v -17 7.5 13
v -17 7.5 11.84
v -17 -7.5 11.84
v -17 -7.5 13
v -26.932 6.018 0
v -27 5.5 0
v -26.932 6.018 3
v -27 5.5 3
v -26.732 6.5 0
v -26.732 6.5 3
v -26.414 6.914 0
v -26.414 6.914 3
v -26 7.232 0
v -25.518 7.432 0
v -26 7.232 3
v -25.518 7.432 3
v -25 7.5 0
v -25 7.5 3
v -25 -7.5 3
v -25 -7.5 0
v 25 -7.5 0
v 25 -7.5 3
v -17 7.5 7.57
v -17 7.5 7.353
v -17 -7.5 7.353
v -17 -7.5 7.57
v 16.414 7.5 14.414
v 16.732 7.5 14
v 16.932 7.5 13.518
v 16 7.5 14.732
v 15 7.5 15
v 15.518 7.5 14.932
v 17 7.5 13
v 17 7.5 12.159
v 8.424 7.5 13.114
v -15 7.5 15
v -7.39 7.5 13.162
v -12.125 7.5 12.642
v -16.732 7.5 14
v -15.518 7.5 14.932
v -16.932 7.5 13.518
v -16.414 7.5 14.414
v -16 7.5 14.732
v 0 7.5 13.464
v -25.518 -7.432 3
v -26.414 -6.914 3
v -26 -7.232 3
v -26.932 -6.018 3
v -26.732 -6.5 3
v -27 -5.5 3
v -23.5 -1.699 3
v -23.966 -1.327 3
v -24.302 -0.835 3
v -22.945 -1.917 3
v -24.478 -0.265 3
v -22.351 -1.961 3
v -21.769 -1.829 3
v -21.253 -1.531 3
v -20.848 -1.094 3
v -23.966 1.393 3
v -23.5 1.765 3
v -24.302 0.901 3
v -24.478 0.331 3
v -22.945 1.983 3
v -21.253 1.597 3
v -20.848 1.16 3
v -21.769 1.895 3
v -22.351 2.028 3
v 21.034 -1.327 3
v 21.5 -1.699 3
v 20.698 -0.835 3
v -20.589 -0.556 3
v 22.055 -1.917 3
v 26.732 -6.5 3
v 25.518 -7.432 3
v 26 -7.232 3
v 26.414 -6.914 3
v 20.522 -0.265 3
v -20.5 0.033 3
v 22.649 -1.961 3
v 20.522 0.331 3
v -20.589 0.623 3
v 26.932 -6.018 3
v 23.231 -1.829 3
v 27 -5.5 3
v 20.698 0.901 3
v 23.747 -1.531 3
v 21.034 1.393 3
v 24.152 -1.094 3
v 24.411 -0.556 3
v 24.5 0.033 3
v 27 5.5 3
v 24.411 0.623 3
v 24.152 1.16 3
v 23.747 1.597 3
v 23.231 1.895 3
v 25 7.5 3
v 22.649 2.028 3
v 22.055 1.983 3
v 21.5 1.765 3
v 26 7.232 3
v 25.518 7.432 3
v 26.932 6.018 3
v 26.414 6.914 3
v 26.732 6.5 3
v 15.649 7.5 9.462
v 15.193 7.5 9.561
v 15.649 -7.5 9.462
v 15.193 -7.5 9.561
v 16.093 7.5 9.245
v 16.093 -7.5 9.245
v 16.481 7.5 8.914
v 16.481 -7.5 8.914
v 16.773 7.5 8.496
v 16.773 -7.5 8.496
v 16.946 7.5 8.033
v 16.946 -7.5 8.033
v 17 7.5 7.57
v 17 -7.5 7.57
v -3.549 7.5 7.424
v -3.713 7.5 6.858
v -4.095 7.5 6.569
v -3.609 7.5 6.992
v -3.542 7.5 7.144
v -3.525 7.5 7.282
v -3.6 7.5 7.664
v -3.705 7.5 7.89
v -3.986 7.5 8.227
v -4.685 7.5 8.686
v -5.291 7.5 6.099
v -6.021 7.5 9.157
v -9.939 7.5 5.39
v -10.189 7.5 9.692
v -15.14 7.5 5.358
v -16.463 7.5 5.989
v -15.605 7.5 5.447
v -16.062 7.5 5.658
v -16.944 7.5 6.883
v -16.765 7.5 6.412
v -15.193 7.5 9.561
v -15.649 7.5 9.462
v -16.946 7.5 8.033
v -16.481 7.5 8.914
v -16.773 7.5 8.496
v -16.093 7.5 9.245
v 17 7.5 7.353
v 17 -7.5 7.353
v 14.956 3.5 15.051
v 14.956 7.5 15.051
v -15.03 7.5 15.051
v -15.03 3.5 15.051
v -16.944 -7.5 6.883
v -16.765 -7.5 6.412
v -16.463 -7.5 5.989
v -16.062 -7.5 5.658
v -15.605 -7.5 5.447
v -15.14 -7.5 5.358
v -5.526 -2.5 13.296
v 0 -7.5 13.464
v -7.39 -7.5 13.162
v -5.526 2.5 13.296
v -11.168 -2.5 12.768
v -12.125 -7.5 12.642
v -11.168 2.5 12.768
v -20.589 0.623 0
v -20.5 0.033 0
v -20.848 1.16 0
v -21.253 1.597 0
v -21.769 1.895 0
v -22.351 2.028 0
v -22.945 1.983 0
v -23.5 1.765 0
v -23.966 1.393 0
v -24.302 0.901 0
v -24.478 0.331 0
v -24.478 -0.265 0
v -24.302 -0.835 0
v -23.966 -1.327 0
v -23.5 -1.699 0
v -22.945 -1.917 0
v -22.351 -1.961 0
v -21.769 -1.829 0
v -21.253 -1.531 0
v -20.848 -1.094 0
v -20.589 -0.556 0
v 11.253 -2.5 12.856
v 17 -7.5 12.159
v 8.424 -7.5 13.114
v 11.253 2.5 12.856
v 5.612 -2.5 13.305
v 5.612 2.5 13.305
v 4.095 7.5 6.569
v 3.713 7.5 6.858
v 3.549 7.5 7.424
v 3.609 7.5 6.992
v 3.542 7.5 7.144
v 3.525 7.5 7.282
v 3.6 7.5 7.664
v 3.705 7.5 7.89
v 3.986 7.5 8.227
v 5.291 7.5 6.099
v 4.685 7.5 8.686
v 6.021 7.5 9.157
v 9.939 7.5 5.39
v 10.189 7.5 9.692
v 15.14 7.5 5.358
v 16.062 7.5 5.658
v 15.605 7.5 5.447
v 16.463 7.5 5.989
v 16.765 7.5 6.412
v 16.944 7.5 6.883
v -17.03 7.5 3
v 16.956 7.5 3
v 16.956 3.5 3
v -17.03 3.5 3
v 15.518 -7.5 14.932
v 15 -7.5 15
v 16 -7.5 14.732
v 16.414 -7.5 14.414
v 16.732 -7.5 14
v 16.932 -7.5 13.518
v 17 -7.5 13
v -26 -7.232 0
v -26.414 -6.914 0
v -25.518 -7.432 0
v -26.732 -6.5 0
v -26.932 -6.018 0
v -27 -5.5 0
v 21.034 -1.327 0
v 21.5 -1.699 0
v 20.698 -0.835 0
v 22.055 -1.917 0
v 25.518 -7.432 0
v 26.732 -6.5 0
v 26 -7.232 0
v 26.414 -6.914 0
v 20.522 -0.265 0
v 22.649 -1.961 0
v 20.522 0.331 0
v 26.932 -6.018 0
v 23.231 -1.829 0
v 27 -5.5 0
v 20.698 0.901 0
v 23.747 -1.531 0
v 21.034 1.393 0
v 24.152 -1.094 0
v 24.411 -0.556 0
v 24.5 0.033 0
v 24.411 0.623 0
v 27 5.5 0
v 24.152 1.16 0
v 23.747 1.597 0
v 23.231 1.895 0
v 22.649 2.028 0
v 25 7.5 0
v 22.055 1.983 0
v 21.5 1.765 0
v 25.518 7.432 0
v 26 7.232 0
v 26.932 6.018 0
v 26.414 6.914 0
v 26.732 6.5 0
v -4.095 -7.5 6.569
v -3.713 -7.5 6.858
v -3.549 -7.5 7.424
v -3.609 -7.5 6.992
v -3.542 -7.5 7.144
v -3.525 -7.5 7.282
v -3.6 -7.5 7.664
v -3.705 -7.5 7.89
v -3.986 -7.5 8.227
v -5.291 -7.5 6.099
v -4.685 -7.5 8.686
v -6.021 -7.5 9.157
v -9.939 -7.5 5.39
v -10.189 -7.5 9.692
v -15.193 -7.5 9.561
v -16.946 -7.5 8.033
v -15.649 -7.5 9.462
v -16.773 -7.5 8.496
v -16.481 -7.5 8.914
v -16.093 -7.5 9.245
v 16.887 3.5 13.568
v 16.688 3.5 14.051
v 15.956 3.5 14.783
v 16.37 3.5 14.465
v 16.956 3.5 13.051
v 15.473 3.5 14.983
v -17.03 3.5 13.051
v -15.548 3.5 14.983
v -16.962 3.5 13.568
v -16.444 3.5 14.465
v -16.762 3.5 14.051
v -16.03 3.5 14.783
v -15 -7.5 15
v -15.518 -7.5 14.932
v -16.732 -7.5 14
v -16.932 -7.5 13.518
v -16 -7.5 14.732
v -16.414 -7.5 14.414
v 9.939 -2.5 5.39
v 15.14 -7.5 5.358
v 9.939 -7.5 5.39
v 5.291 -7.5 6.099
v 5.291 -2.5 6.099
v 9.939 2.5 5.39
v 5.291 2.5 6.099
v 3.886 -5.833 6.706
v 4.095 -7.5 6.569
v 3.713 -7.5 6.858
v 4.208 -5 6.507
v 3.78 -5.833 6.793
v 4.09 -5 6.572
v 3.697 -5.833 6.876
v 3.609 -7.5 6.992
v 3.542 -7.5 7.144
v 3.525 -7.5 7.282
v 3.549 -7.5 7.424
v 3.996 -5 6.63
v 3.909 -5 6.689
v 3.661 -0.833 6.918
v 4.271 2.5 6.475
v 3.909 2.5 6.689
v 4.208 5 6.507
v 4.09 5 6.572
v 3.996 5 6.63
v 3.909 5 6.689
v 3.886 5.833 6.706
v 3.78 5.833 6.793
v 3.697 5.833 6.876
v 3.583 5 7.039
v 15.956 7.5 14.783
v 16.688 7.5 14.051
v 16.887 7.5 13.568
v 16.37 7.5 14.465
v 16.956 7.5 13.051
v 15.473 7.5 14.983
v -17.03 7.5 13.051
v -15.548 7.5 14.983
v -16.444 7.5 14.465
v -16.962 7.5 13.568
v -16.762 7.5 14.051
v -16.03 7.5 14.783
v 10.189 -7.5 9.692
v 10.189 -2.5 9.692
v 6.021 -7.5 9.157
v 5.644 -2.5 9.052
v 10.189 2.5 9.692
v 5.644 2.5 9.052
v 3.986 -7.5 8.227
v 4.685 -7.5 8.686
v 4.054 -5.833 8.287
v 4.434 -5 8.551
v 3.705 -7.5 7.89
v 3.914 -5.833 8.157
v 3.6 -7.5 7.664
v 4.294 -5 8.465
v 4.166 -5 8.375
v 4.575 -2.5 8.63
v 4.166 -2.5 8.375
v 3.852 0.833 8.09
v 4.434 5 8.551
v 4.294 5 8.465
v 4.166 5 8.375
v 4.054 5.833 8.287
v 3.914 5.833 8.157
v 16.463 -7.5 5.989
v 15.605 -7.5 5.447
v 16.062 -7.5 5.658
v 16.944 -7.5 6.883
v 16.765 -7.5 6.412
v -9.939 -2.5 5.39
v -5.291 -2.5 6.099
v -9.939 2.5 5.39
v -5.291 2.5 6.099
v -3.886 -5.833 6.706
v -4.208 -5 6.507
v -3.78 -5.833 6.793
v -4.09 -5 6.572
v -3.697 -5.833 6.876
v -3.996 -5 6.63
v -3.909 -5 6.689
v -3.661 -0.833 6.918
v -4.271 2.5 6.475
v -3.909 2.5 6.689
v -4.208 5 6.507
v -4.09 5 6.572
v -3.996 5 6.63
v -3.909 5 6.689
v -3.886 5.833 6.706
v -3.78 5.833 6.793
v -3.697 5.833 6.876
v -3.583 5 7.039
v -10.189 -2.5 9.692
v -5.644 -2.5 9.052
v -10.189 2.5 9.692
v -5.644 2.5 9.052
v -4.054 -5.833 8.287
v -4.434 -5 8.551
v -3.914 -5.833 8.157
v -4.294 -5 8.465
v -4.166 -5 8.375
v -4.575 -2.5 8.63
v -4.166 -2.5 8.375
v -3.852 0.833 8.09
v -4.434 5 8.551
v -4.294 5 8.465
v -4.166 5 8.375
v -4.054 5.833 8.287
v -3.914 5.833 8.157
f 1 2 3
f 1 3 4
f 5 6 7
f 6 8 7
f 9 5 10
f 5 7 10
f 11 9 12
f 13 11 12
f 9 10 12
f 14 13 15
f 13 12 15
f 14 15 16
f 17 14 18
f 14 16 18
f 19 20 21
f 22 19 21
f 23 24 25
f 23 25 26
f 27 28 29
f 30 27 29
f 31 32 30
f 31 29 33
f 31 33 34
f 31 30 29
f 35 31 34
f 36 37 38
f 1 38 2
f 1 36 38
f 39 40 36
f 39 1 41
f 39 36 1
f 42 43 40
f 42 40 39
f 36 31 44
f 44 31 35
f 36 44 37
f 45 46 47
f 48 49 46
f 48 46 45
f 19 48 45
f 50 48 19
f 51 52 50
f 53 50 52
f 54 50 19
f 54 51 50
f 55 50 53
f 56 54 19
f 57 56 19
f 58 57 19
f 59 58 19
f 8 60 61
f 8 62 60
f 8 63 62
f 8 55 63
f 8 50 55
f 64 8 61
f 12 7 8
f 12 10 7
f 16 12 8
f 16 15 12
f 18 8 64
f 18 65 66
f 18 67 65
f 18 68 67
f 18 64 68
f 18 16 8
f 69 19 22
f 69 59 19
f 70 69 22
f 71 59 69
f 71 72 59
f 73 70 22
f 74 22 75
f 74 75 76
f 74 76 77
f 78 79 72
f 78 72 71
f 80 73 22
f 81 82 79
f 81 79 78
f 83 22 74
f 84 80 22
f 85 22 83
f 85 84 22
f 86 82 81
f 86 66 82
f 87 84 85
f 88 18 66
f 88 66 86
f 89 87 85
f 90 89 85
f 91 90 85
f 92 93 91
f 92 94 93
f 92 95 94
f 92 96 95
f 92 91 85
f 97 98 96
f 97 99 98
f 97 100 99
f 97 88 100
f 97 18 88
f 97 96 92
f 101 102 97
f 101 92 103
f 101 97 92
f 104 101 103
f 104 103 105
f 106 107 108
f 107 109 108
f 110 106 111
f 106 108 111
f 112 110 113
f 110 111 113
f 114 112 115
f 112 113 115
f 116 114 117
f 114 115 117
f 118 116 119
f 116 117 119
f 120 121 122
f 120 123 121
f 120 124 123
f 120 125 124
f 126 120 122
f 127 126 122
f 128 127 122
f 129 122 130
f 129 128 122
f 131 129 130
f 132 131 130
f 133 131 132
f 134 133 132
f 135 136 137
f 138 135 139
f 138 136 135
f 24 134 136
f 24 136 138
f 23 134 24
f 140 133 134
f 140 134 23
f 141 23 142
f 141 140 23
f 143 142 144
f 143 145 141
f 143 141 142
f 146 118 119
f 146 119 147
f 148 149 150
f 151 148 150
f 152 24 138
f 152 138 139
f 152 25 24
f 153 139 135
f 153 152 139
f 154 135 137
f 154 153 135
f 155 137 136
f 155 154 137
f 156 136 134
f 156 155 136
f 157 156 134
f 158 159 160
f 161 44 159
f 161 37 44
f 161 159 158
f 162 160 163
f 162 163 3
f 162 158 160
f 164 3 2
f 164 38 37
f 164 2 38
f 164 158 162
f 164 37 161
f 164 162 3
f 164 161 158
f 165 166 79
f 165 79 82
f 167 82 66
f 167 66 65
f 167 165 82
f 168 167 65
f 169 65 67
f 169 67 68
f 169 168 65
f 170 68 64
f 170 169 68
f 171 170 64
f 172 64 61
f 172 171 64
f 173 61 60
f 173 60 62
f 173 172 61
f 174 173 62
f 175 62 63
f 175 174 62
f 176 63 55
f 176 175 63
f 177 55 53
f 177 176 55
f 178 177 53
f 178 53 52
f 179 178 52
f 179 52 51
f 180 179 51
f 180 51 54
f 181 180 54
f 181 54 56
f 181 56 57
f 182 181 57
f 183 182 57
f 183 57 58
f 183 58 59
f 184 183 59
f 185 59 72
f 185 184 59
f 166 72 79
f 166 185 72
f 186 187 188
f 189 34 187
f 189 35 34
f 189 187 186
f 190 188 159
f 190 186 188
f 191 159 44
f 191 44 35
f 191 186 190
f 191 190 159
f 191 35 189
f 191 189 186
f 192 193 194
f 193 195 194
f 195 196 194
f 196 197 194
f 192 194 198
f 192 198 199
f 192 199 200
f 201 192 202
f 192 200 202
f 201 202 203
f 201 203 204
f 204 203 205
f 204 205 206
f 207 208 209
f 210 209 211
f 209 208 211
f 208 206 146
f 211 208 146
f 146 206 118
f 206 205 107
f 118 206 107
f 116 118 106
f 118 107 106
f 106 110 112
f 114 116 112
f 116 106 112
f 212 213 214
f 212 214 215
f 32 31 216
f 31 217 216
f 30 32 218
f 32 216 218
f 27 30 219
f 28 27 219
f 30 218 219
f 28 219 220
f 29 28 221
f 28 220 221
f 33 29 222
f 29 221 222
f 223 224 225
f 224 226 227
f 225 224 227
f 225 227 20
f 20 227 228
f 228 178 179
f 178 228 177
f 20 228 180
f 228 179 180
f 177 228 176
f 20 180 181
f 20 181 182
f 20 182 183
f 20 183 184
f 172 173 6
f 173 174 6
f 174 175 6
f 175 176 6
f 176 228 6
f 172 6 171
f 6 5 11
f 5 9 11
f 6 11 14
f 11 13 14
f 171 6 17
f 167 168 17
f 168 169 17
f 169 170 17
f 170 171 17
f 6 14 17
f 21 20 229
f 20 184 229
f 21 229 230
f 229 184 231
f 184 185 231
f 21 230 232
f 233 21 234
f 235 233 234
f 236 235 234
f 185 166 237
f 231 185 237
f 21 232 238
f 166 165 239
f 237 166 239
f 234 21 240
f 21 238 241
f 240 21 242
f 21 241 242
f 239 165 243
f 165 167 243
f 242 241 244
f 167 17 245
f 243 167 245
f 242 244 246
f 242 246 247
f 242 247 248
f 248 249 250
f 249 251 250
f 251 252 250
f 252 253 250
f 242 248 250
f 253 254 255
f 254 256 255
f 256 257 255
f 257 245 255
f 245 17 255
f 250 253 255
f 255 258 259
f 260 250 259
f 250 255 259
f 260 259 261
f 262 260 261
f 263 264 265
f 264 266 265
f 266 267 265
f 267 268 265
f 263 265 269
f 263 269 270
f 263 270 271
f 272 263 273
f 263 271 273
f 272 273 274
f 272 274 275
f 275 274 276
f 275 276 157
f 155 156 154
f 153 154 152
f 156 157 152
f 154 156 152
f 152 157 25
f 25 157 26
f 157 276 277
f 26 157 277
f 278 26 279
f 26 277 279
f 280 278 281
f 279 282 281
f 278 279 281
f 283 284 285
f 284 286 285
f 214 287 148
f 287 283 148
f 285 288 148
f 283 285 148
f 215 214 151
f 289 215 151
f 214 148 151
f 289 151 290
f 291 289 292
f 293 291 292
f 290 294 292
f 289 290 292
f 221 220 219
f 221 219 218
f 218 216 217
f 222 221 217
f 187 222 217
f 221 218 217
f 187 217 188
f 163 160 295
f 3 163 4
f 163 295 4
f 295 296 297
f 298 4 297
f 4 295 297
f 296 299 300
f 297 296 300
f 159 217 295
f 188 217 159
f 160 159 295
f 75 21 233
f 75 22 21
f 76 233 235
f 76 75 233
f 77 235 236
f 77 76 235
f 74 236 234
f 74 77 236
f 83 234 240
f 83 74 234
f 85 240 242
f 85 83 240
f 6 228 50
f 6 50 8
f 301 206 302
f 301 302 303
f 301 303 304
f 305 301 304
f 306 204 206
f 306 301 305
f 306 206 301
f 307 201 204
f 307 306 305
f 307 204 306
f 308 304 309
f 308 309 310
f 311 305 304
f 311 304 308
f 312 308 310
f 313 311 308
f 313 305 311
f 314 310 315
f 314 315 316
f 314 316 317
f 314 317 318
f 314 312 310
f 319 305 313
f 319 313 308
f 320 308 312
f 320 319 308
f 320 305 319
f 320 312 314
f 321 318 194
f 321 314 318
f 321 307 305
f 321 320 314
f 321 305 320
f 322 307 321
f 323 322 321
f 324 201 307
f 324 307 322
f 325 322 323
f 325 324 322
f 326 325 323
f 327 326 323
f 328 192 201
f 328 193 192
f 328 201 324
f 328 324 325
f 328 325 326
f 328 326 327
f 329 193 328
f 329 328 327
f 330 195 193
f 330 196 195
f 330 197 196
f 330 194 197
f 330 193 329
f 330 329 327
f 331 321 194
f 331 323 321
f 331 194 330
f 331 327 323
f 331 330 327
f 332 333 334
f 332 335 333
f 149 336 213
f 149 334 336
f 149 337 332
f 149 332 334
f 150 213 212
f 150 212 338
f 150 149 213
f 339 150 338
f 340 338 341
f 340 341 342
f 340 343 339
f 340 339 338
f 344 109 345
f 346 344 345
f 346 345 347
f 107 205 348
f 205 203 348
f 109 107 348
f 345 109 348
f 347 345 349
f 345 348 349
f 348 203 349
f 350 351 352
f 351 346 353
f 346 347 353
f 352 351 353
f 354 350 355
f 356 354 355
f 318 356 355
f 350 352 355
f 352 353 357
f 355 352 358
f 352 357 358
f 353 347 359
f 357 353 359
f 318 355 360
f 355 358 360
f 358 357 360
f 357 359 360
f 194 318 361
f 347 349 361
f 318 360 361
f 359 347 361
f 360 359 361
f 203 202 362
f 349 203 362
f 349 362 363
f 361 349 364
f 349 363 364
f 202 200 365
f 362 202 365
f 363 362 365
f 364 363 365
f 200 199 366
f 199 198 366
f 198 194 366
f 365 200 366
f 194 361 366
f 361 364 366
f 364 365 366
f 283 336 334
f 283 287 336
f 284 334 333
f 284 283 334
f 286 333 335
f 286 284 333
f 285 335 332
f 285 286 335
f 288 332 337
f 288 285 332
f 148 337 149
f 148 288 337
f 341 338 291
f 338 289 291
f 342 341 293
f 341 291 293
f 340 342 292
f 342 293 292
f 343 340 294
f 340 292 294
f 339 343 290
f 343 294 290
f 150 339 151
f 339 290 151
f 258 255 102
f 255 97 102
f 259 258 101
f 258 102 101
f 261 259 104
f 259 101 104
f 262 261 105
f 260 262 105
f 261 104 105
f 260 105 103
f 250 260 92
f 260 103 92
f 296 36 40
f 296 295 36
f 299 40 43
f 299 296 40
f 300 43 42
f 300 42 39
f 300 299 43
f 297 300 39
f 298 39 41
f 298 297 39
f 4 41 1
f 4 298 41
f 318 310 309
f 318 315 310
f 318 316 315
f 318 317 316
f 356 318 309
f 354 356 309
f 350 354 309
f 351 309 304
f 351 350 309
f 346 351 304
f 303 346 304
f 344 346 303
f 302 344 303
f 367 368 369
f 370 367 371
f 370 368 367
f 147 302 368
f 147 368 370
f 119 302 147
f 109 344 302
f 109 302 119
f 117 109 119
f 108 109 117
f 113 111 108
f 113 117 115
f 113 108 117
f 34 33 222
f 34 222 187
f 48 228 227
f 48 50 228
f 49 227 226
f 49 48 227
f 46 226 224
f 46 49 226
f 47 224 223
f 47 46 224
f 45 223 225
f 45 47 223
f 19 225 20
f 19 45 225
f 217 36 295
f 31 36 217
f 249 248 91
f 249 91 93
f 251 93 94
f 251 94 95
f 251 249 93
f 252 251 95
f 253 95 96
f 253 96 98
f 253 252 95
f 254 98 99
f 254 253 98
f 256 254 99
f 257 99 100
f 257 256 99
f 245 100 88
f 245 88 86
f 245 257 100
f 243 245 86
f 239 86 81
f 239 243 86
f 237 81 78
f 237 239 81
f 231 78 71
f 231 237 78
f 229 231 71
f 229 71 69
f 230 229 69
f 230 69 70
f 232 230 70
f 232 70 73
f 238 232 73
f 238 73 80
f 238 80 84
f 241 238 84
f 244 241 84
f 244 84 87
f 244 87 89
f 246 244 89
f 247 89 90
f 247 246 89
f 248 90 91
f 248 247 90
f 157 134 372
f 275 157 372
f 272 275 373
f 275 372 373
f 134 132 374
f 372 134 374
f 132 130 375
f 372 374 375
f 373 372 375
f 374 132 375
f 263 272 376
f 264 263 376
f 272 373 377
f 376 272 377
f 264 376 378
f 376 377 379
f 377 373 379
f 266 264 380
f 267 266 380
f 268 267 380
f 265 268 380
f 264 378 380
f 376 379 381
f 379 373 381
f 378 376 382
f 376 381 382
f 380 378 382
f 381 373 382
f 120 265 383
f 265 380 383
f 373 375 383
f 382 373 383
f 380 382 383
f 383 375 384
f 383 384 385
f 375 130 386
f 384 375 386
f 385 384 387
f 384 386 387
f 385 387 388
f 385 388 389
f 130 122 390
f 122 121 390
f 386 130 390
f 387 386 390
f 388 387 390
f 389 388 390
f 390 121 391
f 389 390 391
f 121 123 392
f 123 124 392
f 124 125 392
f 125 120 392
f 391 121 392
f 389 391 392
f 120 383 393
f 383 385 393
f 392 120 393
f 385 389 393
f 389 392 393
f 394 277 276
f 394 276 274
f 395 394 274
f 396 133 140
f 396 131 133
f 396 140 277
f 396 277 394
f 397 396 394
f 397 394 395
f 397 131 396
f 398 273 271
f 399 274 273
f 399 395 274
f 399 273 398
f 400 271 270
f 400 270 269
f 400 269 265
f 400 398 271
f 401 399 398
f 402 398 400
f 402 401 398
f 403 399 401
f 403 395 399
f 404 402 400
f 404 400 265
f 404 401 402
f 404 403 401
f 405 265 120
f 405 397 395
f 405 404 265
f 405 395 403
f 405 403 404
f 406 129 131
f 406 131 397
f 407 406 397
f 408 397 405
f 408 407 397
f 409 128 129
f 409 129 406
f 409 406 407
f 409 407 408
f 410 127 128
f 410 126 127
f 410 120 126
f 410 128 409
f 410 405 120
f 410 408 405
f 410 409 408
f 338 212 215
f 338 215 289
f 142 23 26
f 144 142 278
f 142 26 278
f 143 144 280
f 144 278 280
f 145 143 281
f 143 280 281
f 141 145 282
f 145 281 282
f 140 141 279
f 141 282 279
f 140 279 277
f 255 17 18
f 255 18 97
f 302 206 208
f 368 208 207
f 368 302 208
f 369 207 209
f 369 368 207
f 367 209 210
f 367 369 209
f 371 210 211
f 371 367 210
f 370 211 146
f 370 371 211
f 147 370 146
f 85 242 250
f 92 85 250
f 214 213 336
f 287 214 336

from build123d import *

# Parameters (mm, degrees)
F0_W     = 54
F0_H     = 15
F0_R     = 2
F1_DEPTH = 3
F3_DEPTH = 15
F4_W     = 33.9856799692
F4_H     = 12.0507893413
F5_DEPTH = 4
F6_R     = 2
F6_2_R   = 2
F6_3_R   = 2
F6_4_R   = 2
F6_5_R   = 2


with BuildPart() as f1:
    # F0 (on Top) → F1 (new body)
    with BuildSketch(Plane.XY):
        Rectangle(F0_W, F0_H)
        with Locations((-22.5, 0.0331350166)):
            Circle(F0_R, mode=Mode.SUBTRACT)
        with Locations((22.5, 0.0331350166)):
            Circle(F0_R, mode=Mode.SUBTRACT)
    extrude(amount=F1_DEPTH)

    # F6
    f6_edges = [f1.edges().sort_by_distance(p)[0] for p in [
        (-27, 7.5, 1.5),
        (-27, -7.5, 1.5),
        (27, -7.5, 1.5),
        (27, 7.5, 1.5),
    ]]
    fillet(f6_edges, radius=F6_R)


with BuildPart() as f3:
    # F2 (on face) → F3 (new body)
    with BuildSketch(Plane(origin=(0, 7.5, 0), x_dir=(-1, 0, 0), z_dir=(0, 1, 0))):
        with BuildLine():
            add(Edge.make_bspline(
                [(-17, 9.3197282404), (-12.7430707216, 10.0780278444), (-3.7856509443, 9.9358474836), (-3.5486822017, 7.4239778332)],
                knots=[0, 0, 0, 0, 13.5842489714, 13.5842489714, 13.5842489714, 13.5842489714], degree=3))
            Line((-17, 9.3197282404), (-17, 5.5756215006))
            add(Edge.make_bspline(
                [(-17, 5.5756215006), (-12.7904647961, 4.8173209652), (-2.9799570329, 5.5756215006), (-3.5486822017, 7.4239778332)],
                knots=[0, 0, 0, 0, 13.5777159951, 13.5777159951, 13.5777159951, 13.5777159951], degree=3))
        make_face()
    extrude(amount=-F3_DEPTH)

    # F6#5
    f6_5_edges = [f3.edges().sort_by_distance(p)[0] for p in [
        (17, 0, 9.319728),
        (17, 0, 5.575622),
    ]]
    fillet(f6_5_edges, radius=F6_5_R)


with BuildPart() as f3b:
    # F2 (on face) → F3, piece 2 (new body)
    with BuildSketch(Plane(origin=(0, 7.5, 0), x_dir=(-1, 0, 0), z_dir=(0, 1, 0))):
        with BuildLine():
            Line((17, 5.5756215006), (17, 9.3197282404))
            add(Edge.make_bspline(
                [(17, 9.3197282404), (12.7430707216, 10.0780278444), (3.7856509443, 9.9358474836), (3.5486822017, 7.4239778332)],
                knots=[0, 0, 0, 0, 13.5842489714, 13.5842489714, 13.5842489714, 13.5842489714], degree=3))
            add(Edge.make_bspline(
                [(17, 5.5756215006), (12.7904647961, 4.8173209652), (2.9799570329, 5.5756215006), (3.5486822017, 7.4239778332)],
                knots=[0, 0, 0, 0, 13.5777159951, 13.5777159951, 13.5777159951, 13.5777159951], degree=3))
        make_face()
    extrude(amount=-F3_DEPTH)

    # F6#4
    f6_4_edges = [f3b.edges().sort_by_distance(p)[0] for p in [
        (-17, 0, 9.319728),
        (-17, 0, 5.575622),
    ]]
    fillet(f6_4_edges, radius=F6_4_R)


with BuildPart() as f3c:
    # F2 (on face) → F3, piece 3 (new body)
    with BuildSketch(Plane(origin=(0, 7.5, 0), x_dir=(-1, 0, 0), z_dir=(0, 1, 0))):
        with BuildLine():
            Line((17, 15), (0, 15))
            Line((0, 15), (0, 13.4638967375))
            add(Edge.make_bspline(
                [(0, 13.4638967375), (5.4909777236, 13.4622868202), (11.050086041, 12.9817824828), (17, 11.8397288024)],
                knots=[17.2021267795, 17.2021267795, 17.2021267795, 17.2021267795, 34.001494822, 34.001494822, 34.001494822, 34.001494822], degree=3))
            Line((17, 11.8397288024), (17, 15))
        make_face()
        with BuildLine():
            Line((0, 15), (-17, 15))
            Line((-17, 15), (-17, 12.1585549787))
            add(Edge.make_bspline(
                [(-17, 12.1585549787), (-11.173807267, 12.9650614468), (-5.6226219168, 13.4655452519), (0, 13.4638967375)],
                knots=[0, 0, 0, 0, 17.2021267795, 17.2021267795, 17.2021267795, 17.2021267795], degree=3))
            Line((0, 13.4638967375), (0, 15))
        make_face()
    extrude(amount=-F3_DEPTH)

    # F6#2
    f6_2_edges = [f3c.edges().sort_by_distance(p)[0] for p in [
        (-17, 0, 15),
        (17, 0, 15),
    ]]
    fillet(f6_2_edges, radius=F6_2_R)


with BuildPart() as f5:
    # F4 (on face) → F5 (new body)
    with BuildSketch(Plane(origin=(0, 7.5, 0), x_dir=(-1, 0, 0), z_dir=(0, 1, 0))):
        with Locations((0.037192367, 9.0253946707)):
            Rectangle(F4_W, F4_H)
    extrude(amount=-F5_DEPTH)

    # F6#3
    f6_3_edges = [f5.edges().sort_by_distance(p)[0] for p in [
        (-17.030032, 5.5, 15.050789),
        (16.955648, 5.5, 15.050789),
    ]]
    fillet(f6_3_edges, radius=F6_3_R)


solid = Compound([f1.part, f3.part, f3b.part, f3c.part, f5.part])
